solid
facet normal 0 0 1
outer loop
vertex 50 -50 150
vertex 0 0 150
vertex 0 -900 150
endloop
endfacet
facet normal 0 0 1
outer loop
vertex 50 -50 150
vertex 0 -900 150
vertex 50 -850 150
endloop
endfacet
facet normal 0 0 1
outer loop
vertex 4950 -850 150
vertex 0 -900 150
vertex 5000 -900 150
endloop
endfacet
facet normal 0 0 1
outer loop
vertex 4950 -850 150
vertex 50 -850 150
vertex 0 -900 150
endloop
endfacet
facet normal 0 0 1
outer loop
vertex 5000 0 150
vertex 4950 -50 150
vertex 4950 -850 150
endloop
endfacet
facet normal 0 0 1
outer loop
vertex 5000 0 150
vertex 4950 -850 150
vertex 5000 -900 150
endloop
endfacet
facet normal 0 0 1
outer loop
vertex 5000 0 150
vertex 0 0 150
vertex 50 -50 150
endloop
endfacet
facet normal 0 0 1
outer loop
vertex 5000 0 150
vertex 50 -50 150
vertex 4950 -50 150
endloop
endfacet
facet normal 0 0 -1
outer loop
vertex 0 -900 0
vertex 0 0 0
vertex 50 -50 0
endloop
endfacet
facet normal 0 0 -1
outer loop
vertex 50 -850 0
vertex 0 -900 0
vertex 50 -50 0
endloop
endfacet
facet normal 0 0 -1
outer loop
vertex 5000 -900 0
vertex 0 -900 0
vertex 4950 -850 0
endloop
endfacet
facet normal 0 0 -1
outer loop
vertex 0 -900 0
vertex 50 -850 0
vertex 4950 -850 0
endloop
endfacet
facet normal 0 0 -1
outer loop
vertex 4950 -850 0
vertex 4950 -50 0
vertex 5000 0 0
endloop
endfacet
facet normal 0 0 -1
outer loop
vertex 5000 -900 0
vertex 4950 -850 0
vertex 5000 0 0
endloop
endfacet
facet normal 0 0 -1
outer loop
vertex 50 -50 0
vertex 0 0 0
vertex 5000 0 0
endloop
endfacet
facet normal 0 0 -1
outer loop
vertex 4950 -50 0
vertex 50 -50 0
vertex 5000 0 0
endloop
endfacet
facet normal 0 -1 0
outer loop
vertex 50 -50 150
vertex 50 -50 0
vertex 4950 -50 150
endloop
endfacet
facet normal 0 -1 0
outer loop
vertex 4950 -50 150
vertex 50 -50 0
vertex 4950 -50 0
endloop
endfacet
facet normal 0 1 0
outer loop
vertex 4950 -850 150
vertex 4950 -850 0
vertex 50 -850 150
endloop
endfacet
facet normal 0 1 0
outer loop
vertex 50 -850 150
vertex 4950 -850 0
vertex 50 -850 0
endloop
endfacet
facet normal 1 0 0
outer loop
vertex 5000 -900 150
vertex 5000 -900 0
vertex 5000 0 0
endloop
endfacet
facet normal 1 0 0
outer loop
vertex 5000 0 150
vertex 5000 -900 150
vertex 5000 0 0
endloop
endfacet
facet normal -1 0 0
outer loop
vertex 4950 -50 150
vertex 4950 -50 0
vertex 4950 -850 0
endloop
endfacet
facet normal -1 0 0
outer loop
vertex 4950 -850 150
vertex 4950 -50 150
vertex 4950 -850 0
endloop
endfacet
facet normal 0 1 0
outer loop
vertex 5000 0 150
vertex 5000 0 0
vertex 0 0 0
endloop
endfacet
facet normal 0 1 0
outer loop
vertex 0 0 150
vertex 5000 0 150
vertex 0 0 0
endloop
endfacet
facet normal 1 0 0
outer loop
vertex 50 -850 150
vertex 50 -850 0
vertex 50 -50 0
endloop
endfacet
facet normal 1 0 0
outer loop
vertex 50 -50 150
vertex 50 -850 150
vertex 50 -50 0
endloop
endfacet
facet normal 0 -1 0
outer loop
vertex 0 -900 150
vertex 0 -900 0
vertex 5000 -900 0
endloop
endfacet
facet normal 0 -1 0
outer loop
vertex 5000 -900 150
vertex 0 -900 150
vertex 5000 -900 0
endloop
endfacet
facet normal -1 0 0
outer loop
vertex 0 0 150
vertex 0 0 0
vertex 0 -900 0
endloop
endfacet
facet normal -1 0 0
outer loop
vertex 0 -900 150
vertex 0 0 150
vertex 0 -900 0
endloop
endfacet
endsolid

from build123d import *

# Parameters (mm, degrees)
F0_W     = 50
F0_H     = 800
F1_DEPTH = 150


with BuildPart() as f1:
    # F0 (on Top) → F1 (new body)
    with BuildSketch(Plane.XY):
        Polygon((5000, 0), (0, 0), (0, -50), (50, -50), (4950, -50), (5000, -50), align=None)
        with Locations((25, -450)):
            Rectangle(F0_W, F0_H)
        Polygon((50, -850), (0, -850), (0, -900), (5000, -900), (5000, -850), (4950, -850), align=None)
        Polygon((5000, -850), (5000, -50), (4950, -50), (4950, -450), (4950, -500), (4950, -850), align=None)
    extrude(amount=F1_DEPTH)


solid = f1.part
